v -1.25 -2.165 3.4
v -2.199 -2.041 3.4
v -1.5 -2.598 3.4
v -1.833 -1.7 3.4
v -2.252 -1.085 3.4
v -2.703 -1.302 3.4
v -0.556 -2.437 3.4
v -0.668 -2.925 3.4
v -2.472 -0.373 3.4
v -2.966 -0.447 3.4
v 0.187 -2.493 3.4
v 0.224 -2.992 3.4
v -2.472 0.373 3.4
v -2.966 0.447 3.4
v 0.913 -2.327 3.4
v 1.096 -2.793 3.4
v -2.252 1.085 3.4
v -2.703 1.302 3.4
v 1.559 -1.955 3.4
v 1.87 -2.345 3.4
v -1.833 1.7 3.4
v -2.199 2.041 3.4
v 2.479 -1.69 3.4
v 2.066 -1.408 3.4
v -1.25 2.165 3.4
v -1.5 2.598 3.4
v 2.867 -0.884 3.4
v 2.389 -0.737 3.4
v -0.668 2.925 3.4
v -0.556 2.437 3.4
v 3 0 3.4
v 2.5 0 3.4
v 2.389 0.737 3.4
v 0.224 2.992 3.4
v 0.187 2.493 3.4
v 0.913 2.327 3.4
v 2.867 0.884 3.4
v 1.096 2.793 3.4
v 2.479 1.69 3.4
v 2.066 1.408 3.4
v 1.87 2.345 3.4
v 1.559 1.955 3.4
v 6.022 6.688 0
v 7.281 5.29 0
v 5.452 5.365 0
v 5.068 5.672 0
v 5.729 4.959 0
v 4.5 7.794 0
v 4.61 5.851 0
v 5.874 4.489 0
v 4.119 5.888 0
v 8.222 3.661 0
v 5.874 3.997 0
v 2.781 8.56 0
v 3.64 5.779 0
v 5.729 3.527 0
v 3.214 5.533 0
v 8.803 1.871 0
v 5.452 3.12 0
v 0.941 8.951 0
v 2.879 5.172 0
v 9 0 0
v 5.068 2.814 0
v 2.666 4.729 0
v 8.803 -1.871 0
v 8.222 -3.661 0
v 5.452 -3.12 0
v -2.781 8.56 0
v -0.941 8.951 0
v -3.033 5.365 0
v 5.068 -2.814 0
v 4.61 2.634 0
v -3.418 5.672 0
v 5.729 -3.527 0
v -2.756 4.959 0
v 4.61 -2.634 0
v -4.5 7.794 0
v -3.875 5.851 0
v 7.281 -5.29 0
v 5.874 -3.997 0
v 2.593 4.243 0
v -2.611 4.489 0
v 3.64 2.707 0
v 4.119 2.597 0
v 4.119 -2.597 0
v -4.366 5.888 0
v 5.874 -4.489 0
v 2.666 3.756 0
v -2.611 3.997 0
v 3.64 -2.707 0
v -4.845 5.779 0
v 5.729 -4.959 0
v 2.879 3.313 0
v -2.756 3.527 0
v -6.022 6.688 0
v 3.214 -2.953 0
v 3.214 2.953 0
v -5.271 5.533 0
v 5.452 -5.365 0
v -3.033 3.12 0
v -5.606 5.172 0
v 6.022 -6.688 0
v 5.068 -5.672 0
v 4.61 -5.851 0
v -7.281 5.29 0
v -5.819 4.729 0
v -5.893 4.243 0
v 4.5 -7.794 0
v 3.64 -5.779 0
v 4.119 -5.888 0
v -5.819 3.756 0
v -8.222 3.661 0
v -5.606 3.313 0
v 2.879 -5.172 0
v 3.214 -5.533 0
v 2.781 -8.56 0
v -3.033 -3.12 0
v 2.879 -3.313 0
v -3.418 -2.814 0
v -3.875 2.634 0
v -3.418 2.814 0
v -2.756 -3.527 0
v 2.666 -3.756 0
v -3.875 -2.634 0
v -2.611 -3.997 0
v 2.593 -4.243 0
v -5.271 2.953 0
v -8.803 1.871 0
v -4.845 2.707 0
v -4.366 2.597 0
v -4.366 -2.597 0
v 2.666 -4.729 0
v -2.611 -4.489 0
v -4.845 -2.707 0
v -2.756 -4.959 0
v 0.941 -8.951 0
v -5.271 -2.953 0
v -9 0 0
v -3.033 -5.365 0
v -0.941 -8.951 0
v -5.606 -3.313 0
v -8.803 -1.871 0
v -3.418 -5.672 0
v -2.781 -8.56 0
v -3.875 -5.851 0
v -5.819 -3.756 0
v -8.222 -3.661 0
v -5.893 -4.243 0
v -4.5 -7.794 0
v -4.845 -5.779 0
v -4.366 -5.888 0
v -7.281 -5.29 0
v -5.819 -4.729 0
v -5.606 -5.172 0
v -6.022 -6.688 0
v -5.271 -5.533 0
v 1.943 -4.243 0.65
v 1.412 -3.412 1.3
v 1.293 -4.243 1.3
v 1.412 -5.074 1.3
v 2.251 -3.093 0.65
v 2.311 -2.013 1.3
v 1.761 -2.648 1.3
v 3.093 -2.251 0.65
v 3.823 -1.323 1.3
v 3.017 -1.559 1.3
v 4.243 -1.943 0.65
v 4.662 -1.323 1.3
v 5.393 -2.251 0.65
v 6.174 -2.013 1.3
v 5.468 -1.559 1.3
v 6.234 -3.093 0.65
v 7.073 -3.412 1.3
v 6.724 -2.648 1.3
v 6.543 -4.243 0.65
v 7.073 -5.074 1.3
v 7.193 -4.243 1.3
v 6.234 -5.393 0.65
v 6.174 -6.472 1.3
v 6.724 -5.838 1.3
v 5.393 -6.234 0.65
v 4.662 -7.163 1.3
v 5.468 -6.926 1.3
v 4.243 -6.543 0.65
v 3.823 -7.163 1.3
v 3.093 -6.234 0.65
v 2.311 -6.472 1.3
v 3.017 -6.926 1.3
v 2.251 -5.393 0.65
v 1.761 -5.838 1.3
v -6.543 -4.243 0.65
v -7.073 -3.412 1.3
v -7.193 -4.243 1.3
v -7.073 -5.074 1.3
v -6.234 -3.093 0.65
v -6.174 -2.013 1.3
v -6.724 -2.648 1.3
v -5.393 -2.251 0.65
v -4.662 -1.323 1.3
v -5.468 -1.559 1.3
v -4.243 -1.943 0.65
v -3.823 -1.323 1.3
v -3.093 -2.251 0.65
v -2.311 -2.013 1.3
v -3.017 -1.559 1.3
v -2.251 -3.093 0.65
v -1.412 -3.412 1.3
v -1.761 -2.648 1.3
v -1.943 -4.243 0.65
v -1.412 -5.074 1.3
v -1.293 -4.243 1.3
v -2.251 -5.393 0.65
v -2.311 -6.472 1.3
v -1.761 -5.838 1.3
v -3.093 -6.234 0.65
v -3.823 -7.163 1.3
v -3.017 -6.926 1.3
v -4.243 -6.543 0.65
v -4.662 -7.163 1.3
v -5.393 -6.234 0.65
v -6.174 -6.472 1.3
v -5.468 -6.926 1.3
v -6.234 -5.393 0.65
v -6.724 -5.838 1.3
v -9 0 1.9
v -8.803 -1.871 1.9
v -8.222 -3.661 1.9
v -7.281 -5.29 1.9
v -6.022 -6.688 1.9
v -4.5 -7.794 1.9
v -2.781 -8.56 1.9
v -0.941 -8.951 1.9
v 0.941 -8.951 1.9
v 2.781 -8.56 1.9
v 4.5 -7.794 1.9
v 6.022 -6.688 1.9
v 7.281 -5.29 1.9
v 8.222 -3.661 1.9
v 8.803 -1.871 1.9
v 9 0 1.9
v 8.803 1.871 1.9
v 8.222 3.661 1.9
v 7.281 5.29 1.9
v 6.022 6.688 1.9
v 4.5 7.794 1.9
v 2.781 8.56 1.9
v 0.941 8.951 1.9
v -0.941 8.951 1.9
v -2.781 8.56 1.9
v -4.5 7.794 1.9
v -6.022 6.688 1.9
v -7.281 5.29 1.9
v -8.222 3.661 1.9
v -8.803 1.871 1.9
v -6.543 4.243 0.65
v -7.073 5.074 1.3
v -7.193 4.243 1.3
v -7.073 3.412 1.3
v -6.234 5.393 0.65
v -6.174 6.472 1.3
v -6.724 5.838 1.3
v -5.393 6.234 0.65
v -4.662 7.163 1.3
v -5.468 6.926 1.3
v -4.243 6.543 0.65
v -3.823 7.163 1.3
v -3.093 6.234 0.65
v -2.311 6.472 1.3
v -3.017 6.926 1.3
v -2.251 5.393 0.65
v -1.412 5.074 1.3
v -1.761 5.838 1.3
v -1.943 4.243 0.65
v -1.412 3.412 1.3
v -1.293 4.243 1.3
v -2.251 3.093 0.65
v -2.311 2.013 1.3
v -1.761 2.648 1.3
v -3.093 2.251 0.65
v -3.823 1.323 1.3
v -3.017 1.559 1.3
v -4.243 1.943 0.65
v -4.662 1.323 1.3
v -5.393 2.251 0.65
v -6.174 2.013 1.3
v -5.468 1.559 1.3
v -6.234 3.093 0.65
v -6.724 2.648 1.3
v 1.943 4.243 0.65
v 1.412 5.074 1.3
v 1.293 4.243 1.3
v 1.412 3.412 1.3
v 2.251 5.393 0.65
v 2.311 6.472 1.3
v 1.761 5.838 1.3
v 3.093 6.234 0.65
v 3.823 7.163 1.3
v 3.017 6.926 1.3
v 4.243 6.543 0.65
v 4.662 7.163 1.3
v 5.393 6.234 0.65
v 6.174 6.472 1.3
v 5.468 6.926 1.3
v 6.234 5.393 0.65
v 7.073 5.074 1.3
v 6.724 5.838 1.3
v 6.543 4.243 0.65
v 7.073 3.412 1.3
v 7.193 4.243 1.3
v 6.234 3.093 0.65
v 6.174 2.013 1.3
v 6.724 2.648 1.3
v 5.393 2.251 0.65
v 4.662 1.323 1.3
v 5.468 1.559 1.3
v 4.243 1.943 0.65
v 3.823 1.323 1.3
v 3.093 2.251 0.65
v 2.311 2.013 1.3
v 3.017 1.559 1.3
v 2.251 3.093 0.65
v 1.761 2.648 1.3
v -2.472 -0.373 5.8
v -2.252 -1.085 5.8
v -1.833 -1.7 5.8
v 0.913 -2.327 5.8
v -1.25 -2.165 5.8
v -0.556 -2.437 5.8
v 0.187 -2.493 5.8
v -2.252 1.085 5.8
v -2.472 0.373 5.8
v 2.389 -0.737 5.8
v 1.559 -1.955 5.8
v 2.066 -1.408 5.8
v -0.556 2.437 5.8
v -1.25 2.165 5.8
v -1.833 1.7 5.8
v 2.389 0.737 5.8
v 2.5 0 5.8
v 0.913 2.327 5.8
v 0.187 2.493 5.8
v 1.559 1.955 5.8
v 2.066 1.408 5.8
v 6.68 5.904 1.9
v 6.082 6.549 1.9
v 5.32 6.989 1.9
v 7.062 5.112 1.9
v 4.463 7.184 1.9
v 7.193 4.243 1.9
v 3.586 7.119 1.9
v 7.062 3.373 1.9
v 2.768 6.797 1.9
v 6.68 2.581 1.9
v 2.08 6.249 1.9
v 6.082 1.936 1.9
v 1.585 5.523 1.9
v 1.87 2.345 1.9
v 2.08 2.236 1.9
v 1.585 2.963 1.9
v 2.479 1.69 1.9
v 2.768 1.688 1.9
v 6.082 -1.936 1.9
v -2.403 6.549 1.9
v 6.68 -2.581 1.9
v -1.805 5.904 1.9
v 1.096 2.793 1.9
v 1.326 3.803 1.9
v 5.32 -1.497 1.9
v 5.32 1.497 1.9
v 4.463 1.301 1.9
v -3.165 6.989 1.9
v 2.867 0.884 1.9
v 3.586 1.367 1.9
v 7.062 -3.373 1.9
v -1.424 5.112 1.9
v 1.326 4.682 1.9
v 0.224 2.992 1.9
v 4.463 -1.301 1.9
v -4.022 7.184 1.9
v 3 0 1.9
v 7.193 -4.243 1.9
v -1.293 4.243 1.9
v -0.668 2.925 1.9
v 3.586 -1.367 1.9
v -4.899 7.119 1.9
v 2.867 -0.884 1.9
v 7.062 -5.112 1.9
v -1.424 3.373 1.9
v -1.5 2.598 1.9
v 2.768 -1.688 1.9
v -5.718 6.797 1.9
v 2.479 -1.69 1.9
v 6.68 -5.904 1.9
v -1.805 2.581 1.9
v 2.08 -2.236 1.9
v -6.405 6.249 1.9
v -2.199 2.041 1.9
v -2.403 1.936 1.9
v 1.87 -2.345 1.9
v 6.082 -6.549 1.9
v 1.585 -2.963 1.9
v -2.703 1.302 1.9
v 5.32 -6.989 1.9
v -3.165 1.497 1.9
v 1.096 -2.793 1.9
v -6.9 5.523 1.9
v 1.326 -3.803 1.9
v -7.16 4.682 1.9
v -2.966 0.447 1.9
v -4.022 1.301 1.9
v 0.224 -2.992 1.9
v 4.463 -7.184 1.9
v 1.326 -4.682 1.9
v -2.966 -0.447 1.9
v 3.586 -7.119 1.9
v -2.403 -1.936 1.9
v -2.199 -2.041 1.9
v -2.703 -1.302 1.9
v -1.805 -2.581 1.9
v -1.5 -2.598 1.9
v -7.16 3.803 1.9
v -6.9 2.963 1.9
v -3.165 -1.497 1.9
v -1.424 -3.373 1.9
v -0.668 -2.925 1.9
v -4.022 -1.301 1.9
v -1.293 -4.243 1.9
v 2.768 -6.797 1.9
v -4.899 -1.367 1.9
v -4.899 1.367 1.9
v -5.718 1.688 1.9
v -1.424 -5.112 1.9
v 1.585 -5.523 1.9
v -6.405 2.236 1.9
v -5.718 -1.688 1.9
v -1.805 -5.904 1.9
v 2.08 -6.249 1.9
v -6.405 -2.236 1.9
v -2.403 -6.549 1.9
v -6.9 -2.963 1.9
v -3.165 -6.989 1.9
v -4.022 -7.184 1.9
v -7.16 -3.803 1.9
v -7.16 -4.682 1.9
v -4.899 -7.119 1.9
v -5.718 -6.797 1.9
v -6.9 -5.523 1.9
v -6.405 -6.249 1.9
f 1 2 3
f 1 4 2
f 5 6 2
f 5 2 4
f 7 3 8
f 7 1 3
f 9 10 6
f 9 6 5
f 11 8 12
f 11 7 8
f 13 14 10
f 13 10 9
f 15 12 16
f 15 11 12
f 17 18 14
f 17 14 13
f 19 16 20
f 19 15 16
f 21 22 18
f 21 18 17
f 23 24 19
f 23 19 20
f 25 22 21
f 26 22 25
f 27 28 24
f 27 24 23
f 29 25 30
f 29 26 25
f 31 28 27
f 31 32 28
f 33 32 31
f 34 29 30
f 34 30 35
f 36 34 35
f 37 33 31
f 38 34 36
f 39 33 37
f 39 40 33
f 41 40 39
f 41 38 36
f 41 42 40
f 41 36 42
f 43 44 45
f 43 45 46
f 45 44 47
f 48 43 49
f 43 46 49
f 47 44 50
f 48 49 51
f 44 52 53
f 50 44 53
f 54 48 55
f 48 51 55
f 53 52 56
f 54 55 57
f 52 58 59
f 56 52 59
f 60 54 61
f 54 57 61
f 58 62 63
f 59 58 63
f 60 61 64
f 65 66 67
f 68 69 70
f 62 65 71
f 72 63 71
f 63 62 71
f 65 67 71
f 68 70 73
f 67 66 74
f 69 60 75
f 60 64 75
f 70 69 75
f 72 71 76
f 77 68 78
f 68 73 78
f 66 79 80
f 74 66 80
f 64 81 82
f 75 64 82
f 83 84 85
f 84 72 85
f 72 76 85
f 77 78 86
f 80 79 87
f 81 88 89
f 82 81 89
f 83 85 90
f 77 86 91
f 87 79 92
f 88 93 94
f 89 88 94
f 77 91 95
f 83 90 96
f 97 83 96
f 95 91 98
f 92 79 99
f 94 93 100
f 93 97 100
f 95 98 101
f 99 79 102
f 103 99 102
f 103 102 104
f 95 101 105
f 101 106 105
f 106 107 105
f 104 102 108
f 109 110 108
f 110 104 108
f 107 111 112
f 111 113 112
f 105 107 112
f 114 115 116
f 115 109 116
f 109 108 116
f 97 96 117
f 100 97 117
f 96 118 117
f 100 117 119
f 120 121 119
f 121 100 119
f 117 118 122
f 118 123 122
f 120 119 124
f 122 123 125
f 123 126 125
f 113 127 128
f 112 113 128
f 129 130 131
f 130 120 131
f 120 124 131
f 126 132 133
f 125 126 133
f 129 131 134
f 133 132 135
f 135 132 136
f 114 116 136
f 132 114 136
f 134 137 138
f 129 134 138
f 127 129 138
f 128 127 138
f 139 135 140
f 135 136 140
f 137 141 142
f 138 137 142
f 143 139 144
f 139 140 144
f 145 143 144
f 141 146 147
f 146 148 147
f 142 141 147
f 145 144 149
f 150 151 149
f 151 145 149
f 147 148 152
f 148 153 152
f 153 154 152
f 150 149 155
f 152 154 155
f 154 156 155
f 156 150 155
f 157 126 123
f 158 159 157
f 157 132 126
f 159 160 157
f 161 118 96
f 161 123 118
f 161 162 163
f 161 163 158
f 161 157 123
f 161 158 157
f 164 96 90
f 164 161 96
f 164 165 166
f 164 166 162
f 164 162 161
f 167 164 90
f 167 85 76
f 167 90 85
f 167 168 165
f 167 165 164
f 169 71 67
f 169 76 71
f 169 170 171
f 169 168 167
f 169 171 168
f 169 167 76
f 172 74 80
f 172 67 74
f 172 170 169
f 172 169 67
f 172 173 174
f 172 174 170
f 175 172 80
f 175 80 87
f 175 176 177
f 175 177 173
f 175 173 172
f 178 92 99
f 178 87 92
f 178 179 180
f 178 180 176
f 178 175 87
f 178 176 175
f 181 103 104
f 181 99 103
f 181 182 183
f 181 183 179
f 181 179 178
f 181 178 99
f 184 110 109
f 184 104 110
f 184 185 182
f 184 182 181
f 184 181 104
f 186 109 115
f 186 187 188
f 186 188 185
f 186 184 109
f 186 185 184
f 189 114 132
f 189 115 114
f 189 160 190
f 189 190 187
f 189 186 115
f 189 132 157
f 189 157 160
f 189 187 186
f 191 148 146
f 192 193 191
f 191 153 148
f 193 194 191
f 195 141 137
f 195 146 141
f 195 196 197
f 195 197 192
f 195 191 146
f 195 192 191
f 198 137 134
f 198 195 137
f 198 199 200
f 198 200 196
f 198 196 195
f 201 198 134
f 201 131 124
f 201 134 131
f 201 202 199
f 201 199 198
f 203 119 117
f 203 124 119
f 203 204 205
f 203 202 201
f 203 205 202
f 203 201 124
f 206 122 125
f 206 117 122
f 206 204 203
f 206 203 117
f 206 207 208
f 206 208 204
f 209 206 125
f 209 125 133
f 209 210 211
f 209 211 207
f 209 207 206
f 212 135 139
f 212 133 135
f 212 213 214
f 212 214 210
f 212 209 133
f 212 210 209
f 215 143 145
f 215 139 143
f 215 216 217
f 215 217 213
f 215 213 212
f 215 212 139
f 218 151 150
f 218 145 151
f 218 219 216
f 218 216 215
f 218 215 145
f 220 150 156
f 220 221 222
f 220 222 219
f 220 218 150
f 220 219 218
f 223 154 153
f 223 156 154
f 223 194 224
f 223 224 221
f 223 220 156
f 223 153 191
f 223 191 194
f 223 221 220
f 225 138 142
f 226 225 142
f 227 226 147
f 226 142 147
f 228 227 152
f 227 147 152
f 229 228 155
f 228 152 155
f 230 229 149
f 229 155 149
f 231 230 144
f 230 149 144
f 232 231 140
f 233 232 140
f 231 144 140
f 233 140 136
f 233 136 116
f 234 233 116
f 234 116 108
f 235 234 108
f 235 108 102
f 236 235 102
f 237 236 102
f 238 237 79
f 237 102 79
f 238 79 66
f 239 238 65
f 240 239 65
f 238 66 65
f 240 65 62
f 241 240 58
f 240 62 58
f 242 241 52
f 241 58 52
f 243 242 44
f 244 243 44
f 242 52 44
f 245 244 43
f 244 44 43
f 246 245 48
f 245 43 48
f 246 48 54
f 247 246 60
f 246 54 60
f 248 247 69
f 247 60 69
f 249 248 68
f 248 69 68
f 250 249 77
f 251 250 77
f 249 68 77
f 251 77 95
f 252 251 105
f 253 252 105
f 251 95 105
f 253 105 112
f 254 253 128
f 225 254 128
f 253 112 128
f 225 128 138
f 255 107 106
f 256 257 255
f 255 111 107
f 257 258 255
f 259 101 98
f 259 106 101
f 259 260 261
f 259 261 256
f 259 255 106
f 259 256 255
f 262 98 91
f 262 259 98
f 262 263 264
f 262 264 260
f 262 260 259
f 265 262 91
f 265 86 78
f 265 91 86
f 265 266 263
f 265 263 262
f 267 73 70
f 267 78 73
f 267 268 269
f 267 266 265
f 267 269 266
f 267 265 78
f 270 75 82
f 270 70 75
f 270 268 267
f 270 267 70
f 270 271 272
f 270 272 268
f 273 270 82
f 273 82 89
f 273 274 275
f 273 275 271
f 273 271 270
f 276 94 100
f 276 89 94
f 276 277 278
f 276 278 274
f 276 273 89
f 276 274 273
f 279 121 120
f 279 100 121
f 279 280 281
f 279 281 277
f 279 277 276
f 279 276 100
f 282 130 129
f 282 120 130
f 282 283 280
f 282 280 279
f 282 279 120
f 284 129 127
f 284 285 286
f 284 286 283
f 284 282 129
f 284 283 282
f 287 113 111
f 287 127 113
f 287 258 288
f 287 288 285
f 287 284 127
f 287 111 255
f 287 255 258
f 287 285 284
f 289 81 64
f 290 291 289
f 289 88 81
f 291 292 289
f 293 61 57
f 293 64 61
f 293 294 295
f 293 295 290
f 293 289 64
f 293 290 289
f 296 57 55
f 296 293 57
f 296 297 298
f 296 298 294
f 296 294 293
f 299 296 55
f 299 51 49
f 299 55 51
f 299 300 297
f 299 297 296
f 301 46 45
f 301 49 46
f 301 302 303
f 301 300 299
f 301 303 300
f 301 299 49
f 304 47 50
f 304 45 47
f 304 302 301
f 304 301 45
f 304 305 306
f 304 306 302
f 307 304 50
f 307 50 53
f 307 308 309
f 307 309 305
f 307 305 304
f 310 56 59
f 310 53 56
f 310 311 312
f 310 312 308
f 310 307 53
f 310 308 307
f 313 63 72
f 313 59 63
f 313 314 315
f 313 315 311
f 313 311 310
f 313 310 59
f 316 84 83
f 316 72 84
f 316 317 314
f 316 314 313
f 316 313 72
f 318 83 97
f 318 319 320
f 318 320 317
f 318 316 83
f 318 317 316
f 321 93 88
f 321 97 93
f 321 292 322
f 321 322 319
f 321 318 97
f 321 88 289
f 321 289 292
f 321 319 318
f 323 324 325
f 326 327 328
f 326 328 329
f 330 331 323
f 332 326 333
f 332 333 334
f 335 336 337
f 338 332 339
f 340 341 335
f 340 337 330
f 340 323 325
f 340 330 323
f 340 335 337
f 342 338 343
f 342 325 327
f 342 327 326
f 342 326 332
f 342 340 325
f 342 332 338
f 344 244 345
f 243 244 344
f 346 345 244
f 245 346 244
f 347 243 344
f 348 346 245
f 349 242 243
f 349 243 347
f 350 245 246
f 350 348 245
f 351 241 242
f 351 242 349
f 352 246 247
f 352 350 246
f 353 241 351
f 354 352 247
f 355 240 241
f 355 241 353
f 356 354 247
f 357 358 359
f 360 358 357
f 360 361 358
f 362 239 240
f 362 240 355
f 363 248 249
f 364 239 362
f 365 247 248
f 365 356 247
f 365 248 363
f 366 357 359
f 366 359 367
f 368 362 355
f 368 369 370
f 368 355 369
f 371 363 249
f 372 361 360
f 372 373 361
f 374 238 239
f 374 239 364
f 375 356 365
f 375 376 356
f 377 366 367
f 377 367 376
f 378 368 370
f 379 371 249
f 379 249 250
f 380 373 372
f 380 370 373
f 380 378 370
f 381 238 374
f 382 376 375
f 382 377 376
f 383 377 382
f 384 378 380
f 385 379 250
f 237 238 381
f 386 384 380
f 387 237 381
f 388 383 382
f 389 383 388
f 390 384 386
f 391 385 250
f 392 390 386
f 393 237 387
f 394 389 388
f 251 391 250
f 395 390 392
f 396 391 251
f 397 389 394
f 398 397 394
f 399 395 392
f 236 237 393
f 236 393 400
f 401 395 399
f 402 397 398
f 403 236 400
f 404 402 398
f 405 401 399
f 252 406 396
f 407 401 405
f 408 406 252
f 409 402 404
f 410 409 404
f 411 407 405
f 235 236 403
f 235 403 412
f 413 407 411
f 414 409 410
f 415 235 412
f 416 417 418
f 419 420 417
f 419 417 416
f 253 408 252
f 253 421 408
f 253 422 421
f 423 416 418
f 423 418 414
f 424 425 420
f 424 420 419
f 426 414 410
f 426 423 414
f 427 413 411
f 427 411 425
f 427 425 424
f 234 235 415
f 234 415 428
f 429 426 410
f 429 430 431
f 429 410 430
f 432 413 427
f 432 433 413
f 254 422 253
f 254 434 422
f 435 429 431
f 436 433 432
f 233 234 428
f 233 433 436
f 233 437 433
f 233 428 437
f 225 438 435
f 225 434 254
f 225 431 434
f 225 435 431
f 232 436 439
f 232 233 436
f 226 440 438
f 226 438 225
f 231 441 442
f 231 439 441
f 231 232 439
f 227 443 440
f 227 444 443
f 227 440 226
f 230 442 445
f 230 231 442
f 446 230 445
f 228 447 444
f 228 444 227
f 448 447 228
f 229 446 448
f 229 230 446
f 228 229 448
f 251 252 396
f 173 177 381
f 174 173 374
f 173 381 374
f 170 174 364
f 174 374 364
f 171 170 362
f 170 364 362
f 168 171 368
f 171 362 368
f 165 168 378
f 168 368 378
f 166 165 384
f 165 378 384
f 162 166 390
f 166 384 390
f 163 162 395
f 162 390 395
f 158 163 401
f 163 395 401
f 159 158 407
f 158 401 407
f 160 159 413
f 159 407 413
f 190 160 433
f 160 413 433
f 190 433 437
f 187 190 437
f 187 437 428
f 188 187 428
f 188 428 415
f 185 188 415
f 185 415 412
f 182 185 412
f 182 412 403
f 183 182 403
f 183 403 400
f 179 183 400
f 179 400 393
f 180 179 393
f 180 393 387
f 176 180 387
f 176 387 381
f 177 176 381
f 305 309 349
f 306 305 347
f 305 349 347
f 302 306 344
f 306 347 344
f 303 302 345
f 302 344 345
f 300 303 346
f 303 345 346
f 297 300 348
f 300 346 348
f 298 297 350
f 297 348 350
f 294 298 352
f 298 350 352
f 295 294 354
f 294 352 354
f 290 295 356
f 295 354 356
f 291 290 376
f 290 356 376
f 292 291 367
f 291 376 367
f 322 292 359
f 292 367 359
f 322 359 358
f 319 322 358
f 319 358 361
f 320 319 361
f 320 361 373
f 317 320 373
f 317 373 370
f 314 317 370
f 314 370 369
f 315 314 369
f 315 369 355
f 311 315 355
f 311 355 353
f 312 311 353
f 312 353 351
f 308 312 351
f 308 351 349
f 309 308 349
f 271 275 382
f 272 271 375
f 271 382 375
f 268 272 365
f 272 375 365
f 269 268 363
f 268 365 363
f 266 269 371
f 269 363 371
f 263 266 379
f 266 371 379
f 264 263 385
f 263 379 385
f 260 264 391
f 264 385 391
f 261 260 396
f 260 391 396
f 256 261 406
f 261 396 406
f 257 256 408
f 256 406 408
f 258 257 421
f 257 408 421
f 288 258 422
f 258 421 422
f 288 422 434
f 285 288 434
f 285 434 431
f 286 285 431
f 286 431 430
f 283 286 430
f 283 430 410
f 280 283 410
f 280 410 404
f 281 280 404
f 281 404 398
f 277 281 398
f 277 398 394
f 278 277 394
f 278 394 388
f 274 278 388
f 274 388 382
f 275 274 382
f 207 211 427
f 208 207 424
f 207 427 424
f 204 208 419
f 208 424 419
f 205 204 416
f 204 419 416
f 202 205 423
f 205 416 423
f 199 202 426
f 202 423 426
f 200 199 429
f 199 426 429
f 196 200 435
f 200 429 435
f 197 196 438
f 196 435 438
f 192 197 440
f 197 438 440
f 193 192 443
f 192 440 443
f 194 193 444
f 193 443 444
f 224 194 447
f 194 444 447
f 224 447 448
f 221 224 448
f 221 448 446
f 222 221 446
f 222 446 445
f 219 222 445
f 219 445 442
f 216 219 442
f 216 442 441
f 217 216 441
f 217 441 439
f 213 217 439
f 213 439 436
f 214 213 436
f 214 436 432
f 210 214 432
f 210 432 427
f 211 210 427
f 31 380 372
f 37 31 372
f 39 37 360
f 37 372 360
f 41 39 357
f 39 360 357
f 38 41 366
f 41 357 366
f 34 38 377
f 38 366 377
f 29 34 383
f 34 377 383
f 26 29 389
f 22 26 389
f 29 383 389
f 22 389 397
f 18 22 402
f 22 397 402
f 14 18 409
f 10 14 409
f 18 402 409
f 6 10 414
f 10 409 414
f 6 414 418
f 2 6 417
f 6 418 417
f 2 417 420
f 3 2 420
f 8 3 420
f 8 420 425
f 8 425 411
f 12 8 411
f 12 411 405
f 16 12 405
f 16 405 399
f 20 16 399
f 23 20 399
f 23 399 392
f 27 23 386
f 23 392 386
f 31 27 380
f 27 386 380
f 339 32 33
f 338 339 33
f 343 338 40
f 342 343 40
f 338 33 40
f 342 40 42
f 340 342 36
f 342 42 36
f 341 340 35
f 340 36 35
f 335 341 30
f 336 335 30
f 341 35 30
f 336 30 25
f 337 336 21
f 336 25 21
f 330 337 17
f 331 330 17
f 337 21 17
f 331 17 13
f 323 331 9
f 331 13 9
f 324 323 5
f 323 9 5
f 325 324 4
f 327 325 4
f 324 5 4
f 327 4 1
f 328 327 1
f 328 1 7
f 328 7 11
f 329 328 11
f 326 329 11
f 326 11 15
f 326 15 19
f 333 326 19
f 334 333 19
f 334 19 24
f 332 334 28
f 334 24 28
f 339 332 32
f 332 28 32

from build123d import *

# Parameters (mm, degrees)
SKETCH1_R           = 9
SKETCH1_R_2         = 1.55
BOSS_EXTRUDE1_DEPTH = 1.9
SKETCH2_R           = 3
BOSS_EXTRUDE2_DEPTH = 1.5
SKETCH3_R           = 2.5
BOSS_EXTRUDE3_DEPTH = 2.4
SKETCH4_R           = 2.95
CUT_EXTRUDE1_DEPTH  = 0.6
CHAMFER1_SIZE       = 1.4


with BuildPart() as part:
    # Sketch1 → Boss-Extrude1 (new body)
    with BuildSketch(Plane(origin=(0, 0, 0), x_dir=(0, 1, 0), z_dir=(0, 0, 1))):
        with Locations(Location((0, 0, 0), (0, 0, 90))):
            Circle(SKETCH1_R)
        with Locations(Location((-4.242640687, 4.242640687, 0), (0, 0, 90))):
            Circle(SKETCH1_R_2, mode=Mode.SUBTRACT)
        with Locations(Location((4.242640687, 4.242640687, 0), (0, 0, 90))):
            Circle(SKETCH1_R_2, mode=Mode.SUBTRACT)
        with Locations(Location((4.242640687, -4.242640687, 0), (0, 0, 90))):
            Circle(SKETCH1_R_2, mode=Mode.SUBTRACT)
        with Locations(Location((-4.242640687, -4.242640687, 0), (0, 0, 90))):
            Circle(SKETCH1_R_2, mode=Mode.SUBTRACT)
    extrude(amount=BOSS_EXTRUDE1_DEPTH)

    # Sketch2 → Boss-Extrude2 (add)
    with BuildSketch(Plane.XY.offset(1.9)):
        Circle(SKETCH2_R)
    extrude(amount=BOSS_EXTRUDE2_DEPTH)

    # Sketch3 → Boss-Extrude3 (add)
    with BuildSketch(Plane.XY.offset(3.4)):
        Circle(SKETCH3_R)
    extrude(amount=BOSS_EXTRUDE3_DEPTH)

    # Sketch4 → Cut-Extrude1 (cut)
    with BuildSketch(Plane.XY.offset(1.9)):
        with Locations((-4.242640687, 4.242640687)):
            Circle(SKETCH4_R)
        with Locations((4.242640687, 4.242640687)):
            Circle(SKETCH4_R)
        with Locations((4.242640687, -4.242640687)):
            Circle(SKETCH4_R)
        with Locations((-4.242640687, -4.242640687)):
            Circle(SKETCH4_R)
    extrude(amount=-CUT_EXTRUDE1_DEPTH, mode=Mode.SUBTRACT)

    # Chamfer1
    # the kernel refuses this chamfer: 1.4 mm, written as the material it takes off along each edge
    with BuildSketch(Plane(origin=(-4.242640687, -4.242640687, 1.3), x_dir=(-1, 0, 0), z_dir=(0, -1, 0))) as chamfer1_piece_1_section:
        Polygon((1.55, CHAMFER1_SIZE), (1.55 + CHAMFER1_SIZE, 0), (1.55, 0), align=None)
    chamfer1_piece_1 = revolve(axis=Axis((-4.242640687, -4.242640687, 1.3), (0, 0, -1)), mode=Mode.PRIVATE)
    chamfer1_piece_1 = chamfer1_piece_1 & Plane(origin=(-4.242640687, -4.242640687, 0.597078296), x_dir=(1, 0, 0), z_dir=(0, 0, 1)) * Cylinder(2.95, 12, mode=Mode.PRIVATE)
    add(chamfer1_piece_1, mode=Mode.SUBTRACT)
    with BuildSketch(Plane(origin=(4.242640687, -4.242640687, 1.3), x_dir=(-1, 0, 0), z_dir=(0, -1, 0))) as chamfer1_piece_2_section:
        Polygon((1.55, CHAMFER1_SIZE), (1.55 + CHAMFER1_SIZE, 0), (1.55, 0), align=None)
    chamfer1_piece_2 = revolve(axis=Axis((4.242640687, -4.242640687, 1.3), (0, 0, -1)), mode=Mode.PRIVATE)
    chamfer1_piece_2 = chamfer1_piece_2 & Plane(origin=(4.242640687, -4.242640687, 0.597078296), x_dir=(1, 0, 0), z_dir=(0, 0, 1)) * Cylinder(2.95, 12, mode=Mode.PRIVATE)
    add(chamfer1_piece_2, mode=Mode.SUBTRACT)
    with BuildSketch(Plane(origin=(4.242640687, 4.242640687, 1.3), x_dir=(-1, 0, 0), z_dir=(0, -1, 0))) as chamfer1_piece_3_section:
        Polygon((1.55, CHAMFER1_SIZE), (1.55 + CHAMFER1_SIZE, 0), (1.55, 0), align=None)
    chamfer1_piece_3 = revolve(axis=Axis((4.242640687, 4.242640687, 1.3), (0, 0, -1)), mode=Mode.PRIVATE)
    chamfer1_piece_3 = chamfer1_piece_3 & Plane(origin=(4.242640687, 4.242640687, 0.597078296), x_dir=(1, 0, 0), z_dir=(0, 0, 1)) * Cylinder(2.95, 12, mode=Mode.PRIVATE)
    add(chamfer1_piece_3, mode=Mode.SUBTRACT)
    with BuildSketch(Plane(origin=(-4.242640687, 4.242640687, 1.3), x_dir=(-1, 0, 0), z_dir=(0, -1, 0))) as chamfer1_piece_4_section:
        Polygon((1.55, CHAMFER1_SIZE), (1.55 + CHAMFER1_SIZE, 0), (1.55, 0), align=None)
    chamfer1_piece_4 = revolve(axis=Axis((-4.242640687, 4.242640687, 1.3), (0, 0, -1)), mode=Mode.PRIVATE)
    chamfer1_piece_4 = chamfer1_piece_4 & Plane(origin=(-4.242640687, 4.242640687, 0.597078296), x_dir=(1, 0, 0), z_dir=(0, 0, 1)) * Cylinder(2.95, 12, mode=Mode.PRIVATE)
    add(chamfer1_piece_4, mode=Mode.SUBTRACT)


solid = part.part
